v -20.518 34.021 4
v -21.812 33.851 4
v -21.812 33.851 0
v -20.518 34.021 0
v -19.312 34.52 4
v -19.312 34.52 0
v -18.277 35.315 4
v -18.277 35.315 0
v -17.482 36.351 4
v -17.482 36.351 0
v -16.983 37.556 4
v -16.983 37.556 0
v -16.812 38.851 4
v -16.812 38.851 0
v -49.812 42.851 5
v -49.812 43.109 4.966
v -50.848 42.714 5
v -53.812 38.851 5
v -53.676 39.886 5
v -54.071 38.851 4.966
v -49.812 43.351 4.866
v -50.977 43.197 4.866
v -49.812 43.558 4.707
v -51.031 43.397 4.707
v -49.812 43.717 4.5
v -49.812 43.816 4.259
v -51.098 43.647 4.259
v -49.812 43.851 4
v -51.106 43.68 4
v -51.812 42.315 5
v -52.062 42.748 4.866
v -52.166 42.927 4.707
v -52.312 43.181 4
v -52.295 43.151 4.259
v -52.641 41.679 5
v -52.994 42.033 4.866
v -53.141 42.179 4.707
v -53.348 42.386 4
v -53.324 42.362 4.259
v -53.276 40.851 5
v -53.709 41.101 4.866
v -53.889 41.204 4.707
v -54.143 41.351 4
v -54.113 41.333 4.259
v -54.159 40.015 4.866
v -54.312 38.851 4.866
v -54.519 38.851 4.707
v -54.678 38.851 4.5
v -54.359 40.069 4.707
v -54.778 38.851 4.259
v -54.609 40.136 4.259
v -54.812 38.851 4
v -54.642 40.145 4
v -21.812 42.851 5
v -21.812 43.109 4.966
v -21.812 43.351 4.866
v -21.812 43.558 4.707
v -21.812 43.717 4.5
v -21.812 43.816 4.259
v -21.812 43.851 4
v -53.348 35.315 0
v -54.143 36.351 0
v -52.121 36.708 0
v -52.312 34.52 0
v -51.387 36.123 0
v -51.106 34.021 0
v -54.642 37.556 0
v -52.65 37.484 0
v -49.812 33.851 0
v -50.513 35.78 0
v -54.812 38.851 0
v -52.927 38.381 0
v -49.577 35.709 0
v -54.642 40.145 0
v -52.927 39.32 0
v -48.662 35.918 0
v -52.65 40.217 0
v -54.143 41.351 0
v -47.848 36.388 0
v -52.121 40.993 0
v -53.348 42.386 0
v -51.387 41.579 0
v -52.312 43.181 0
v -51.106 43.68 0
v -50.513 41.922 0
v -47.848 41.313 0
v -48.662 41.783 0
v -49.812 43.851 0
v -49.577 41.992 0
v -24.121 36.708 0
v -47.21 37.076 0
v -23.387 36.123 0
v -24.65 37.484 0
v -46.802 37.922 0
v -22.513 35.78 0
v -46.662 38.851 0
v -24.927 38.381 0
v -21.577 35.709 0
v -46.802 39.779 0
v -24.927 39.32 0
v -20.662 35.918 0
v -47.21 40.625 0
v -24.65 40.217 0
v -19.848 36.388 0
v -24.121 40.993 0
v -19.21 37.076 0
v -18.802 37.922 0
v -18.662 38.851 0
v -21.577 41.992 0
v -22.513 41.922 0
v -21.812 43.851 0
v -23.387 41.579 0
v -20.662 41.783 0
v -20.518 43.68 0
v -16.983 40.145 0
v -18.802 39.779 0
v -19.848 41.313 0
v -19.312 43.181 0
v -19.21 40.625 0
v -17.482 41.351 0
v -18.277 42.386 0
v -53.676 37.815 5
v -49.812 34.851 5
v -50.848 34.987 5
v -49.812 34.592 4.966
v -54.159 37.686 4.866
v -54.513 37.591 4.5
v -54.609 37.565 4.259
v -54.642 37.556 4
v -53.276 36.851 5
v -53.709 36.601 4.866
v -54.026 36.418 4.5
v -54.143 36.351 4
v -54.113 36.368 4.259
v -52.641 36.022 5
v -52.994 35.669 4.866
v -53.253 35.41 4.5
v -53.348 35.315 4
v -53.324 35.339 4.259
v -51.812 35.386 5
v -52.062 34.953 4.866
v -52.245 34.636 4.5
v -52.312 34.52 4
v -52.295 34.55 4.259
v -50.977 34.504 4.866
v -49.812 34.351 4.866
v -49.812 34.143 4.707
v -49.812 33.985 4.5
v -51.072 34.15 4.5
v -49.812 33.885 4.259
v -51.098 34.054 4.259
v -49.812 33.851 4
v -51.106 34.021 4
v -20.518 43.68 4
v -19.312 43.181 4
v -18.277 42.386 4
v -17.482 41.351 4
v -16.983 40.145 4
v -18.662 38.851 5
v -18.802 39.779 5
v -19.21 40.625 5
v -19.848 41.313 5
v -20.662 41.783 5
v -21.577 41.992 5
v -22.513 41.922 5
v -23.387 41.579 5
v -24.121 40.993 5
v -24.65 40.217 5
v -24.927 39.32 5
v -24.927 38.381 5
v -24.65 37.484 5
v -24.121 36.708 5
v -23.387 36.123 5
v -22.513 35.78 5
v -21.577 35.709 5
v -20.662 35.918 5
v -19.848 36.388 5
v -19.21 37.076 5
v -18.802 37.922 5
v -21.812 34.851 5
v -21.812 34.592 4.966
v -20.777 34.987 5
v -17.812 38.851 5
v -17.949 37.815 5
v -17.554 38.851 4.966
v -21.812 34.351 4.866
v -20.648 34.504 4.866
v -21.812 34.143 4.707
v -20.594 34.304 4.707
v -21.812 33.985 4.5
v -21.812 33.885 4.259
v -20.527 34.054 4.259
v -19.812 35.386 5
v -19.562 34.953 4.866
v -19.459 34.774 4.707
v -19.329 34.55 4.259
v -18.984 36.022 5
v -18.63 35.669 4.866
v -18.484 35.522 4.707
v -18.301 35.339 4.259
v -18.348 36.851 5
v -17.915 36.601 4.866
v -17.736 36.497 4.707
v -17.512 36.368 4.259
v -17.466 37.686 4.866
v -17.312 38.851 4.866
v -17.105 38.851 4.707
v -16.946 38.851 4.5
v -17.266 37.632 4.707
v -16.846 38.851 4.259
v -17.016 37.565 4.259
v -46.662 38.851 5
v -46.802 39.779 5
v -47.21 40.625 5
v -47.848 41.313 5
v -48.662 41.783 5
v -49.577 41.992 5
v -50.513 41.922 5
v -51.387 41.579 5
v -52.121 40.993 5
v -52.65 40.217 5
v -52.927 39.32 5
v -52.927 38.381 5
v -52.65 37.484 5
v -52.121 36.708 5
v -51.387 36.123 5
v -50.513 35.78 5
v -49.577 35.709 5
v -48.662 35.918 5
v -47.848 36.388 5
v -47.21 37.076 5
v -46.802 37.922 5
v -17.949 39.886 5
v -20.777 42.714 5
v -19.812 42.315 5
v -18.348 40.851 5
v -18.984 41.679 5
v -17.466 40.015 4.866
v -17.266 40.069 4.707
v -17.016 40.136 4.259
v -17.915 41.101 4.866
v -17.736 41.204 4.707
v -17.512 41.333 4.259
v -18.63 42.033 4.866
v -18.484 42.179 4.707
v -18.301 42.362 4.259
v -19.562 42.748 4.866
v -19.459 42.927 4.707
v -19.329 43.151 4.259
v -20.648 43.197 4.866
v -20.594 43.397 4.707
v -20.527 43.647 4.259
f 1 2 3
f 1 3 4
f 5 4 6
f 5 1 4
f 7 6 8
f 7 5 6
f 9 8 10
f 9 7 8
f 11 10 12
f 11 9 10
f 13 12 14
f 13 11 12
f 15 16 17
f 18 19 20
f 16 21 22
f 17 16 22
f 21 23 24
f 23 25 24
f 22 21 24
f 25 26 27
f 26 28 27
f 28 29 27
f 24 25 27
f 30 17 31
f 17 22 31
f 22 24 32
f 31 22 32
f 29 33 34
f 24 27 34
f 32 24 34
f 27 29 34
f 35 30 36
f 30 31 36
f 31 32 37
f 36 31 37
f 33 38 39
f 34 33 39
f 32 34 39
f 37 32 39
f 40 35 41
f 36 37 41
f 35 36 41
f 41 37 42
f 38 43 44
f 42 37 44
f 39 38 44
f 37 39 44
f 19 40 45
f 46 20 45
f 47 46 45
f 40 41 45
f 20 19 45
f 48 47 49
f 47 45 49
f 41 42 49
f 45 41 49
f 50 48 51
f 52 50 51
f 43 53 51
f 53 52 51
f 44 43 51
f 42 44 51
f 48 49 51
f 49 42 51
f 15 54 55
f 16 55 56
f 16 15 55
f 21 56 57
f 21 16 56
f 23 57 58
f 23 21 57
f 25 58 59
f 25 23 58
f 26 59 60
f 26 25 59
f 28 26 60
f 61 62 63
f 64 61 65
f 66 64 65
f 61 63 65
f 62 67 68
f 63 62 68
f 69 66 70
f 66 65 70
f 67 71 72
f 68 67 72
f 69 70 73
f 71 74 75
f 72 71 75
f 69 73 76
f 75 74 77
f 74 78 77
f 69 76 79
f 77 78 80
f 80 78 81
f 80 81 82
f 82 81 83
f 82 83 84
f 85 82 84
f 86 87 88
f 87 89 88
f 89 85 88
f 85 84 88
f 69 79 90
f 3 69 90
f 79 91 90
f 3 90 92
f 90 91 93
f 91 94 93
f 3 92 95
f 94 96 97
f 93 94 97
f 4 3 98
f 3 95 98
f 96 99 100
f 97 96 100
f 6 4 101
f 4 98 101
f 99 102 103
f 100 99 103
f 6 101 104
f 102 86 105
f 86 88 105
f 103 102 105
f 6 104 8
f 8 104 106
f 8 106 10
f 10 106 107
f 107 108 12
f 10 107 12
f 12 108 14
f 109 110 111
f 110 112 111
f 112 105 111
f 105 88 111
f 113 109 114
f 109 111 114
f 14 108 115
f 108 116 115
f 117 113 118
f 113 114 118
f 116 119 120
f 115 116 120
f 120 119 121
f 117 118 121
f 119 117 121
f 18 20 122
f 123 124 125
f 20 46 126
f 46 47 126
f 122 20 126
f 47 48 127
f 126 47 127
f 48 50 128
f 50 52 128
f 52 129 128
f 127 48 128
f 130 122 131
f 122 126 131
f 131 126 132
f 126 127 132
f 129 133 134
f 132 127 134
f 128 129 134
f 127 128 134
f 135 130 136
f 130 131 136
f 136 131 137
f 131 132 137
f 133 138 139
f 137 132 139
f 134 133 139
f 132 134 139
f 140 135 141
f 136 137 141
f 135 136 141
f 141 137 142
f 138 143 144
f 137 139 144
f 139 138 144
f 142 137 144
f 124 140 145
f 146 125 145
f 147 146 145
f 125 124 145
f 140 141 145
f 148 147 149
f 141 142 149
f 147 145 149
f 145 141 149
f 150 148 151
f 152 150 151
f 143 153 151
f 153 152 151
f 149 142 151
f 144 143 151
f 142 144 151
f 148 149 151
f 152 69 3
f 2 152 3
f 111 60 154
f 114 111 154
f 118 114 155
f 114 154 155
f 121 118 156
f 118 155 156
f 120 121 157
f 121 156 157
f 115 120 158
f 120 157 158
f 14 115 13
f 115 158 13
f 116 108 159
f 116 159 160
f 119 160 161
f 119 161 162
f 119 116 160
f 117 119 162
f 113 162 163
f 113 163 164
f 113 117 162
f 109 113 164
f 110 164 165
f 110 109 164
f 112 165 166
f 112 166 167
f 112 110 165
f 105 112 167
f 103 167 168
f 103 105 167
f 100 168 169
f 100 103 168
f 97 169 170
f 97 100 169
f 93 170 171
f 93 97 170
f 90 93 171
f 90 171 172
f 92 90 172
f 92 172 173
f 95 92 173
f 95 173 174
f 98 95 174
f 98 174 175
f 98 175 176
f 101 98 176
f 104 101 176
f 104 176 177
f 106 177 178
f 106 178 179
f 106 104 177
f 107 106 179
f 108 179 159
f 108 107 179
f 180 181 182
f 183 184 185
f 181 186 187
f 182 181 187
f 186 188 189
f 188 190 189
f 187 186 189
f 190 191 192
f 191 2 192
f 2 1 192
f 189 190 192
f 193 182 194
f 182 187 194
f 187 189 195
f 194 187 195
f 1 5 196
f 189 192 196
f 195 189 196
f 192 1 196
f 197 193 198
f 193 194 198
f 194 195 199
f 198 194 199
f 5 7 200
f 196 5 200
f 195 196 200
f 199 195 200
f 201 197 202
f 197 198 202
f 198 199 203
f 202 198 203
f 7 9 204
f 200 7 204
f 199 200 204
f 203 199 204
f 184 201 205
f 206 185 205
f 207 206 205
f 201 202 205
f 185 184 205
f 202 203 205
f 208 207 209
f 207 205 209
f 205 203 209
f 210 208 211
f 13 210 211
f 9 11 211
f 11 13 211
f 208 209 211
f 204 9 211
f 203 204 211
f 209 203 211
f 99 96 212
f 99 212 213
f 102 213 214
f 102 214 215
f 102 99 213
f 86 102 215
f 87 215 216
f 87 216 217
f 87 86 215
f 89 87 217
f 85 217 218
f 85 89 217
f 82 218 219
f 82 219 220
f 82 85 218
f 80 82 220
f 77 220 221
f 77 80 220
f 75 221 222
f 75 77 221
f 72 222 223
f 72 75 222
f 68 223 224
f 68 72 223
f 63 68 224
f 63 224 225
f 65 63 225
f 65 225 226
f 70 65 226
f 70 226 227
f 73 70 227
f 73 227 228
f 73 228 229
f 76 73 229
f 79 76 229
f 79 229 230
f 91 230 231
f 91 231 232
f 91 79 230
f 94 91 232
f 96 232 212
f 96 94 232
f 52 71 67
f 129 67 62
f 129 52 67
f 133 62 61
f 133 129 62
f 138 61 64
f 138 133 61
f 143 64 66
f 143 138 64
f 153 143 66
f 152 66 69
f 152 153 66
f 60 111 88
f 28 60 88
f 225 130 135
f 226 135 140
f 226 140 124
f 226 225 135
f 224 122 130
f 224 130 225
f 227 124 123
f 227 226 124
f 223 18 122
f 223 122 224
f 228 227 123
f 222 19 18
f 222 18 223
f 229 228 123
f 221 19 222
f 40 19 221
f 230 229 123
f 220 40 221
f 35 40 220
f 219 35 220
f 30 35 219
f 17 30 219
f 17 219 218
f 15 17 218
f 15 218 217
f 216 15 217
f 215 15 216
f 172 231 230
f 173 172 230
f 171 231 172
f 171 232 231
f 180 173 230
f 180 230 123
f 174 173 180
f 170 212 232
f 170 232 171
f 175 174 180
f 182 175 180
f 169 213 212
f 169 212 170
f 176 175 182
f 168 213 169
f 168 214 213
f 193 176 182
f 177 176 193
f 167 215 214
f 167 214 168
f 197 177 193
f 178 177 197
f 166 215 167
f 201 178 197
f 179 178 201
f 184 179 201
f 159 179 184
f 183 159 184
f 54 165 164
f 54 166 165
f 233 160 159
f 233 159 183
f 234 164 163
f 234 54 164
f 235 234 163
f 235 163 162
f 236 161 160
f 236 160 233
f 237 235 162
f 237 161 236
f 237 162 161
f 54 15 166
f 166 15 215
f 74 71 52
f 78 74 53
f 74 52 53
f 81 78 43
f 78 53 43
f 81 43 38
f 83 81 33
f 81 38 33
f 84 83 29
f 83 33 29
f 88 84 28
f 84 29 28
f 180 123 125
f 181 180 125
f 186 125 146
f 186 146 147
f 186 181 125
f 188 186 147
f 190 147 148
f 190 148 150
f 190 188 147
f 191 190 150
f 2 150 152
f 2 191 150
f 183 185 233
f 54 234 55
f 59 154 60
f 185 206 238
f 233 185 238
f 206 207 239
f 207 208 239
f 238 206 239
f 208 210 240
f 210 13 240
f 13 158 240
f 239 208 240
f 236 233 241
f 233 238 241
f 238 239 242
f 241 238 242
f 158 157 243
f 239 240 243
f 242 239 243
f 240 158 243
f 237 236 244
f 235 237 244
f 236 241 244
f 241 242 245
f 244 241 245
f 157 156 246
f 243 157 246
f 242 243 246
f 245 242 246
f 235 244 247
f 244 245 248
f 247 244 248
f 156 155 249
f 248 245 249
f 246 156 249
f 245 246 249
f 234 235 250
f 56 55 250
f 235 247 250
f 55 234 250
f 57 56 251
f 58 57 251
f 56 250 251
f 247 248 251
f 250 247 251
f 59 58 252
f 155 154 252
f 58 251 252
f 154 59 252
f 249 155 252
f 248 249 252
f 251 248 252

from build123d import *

# Parameters (mm, degrees)
F0_R     = 3.15
F1_DEPTH = 5
F2_R     = 4.99999
F3_R     = 1


# Not quite as in the source:
# - a fillet or chamfer is up to 0.001 mm smaller than in the source, because OpenCascade refuses the exact size


with BuildPart() as f1:
    # F0 (on Top) → F1 (new body)
    with BuildSketch(Plane.XY):
        Polygon((-49.8123717308, 43.8505291194), (-54.8123717308, 43.8505291194), (-54.8123717308, 33.8505291194), (-16.8123717308, 33.8505291194), (-16.8123717308, 43.8505291194), align=None)
        with Locations((-49.8123717308, 38.8505291194)):
            Circle(F0_R, mode=Mode.SUBTRACT)
        with Locations((-21.8123717308, 38.8505291194)):
            Circle(F0_R, mode=Mode.SUBTRACT)
    extrude(amount=F1_DEPTH)

    # F2 (radius 5 in the source; OpenCascade refuses exactly that, so slightly less here)
    f2_edges = [f1.edges().sort_by_distance(p)[0] for p in [
        (-54.812372, 33.850529, 2.5),
        (-54.812372, 43.850529, 2.5),
        (-16.812372, 43.850529, 2.5),
        (-16.812372, 33.850529, 2.5),
    ]]
    fillet(f2_edges, radius=F2_R)

    # F3
    f3_edges = [f1.edges().sort_by_distance(p)[0] for p in [
        (-35.812372, 33.850529, 5),
        (-35.812372, 43.850529, 5),
    ]]
    fillet(f3_edges, radius=F3_R)


solid = f1.part
